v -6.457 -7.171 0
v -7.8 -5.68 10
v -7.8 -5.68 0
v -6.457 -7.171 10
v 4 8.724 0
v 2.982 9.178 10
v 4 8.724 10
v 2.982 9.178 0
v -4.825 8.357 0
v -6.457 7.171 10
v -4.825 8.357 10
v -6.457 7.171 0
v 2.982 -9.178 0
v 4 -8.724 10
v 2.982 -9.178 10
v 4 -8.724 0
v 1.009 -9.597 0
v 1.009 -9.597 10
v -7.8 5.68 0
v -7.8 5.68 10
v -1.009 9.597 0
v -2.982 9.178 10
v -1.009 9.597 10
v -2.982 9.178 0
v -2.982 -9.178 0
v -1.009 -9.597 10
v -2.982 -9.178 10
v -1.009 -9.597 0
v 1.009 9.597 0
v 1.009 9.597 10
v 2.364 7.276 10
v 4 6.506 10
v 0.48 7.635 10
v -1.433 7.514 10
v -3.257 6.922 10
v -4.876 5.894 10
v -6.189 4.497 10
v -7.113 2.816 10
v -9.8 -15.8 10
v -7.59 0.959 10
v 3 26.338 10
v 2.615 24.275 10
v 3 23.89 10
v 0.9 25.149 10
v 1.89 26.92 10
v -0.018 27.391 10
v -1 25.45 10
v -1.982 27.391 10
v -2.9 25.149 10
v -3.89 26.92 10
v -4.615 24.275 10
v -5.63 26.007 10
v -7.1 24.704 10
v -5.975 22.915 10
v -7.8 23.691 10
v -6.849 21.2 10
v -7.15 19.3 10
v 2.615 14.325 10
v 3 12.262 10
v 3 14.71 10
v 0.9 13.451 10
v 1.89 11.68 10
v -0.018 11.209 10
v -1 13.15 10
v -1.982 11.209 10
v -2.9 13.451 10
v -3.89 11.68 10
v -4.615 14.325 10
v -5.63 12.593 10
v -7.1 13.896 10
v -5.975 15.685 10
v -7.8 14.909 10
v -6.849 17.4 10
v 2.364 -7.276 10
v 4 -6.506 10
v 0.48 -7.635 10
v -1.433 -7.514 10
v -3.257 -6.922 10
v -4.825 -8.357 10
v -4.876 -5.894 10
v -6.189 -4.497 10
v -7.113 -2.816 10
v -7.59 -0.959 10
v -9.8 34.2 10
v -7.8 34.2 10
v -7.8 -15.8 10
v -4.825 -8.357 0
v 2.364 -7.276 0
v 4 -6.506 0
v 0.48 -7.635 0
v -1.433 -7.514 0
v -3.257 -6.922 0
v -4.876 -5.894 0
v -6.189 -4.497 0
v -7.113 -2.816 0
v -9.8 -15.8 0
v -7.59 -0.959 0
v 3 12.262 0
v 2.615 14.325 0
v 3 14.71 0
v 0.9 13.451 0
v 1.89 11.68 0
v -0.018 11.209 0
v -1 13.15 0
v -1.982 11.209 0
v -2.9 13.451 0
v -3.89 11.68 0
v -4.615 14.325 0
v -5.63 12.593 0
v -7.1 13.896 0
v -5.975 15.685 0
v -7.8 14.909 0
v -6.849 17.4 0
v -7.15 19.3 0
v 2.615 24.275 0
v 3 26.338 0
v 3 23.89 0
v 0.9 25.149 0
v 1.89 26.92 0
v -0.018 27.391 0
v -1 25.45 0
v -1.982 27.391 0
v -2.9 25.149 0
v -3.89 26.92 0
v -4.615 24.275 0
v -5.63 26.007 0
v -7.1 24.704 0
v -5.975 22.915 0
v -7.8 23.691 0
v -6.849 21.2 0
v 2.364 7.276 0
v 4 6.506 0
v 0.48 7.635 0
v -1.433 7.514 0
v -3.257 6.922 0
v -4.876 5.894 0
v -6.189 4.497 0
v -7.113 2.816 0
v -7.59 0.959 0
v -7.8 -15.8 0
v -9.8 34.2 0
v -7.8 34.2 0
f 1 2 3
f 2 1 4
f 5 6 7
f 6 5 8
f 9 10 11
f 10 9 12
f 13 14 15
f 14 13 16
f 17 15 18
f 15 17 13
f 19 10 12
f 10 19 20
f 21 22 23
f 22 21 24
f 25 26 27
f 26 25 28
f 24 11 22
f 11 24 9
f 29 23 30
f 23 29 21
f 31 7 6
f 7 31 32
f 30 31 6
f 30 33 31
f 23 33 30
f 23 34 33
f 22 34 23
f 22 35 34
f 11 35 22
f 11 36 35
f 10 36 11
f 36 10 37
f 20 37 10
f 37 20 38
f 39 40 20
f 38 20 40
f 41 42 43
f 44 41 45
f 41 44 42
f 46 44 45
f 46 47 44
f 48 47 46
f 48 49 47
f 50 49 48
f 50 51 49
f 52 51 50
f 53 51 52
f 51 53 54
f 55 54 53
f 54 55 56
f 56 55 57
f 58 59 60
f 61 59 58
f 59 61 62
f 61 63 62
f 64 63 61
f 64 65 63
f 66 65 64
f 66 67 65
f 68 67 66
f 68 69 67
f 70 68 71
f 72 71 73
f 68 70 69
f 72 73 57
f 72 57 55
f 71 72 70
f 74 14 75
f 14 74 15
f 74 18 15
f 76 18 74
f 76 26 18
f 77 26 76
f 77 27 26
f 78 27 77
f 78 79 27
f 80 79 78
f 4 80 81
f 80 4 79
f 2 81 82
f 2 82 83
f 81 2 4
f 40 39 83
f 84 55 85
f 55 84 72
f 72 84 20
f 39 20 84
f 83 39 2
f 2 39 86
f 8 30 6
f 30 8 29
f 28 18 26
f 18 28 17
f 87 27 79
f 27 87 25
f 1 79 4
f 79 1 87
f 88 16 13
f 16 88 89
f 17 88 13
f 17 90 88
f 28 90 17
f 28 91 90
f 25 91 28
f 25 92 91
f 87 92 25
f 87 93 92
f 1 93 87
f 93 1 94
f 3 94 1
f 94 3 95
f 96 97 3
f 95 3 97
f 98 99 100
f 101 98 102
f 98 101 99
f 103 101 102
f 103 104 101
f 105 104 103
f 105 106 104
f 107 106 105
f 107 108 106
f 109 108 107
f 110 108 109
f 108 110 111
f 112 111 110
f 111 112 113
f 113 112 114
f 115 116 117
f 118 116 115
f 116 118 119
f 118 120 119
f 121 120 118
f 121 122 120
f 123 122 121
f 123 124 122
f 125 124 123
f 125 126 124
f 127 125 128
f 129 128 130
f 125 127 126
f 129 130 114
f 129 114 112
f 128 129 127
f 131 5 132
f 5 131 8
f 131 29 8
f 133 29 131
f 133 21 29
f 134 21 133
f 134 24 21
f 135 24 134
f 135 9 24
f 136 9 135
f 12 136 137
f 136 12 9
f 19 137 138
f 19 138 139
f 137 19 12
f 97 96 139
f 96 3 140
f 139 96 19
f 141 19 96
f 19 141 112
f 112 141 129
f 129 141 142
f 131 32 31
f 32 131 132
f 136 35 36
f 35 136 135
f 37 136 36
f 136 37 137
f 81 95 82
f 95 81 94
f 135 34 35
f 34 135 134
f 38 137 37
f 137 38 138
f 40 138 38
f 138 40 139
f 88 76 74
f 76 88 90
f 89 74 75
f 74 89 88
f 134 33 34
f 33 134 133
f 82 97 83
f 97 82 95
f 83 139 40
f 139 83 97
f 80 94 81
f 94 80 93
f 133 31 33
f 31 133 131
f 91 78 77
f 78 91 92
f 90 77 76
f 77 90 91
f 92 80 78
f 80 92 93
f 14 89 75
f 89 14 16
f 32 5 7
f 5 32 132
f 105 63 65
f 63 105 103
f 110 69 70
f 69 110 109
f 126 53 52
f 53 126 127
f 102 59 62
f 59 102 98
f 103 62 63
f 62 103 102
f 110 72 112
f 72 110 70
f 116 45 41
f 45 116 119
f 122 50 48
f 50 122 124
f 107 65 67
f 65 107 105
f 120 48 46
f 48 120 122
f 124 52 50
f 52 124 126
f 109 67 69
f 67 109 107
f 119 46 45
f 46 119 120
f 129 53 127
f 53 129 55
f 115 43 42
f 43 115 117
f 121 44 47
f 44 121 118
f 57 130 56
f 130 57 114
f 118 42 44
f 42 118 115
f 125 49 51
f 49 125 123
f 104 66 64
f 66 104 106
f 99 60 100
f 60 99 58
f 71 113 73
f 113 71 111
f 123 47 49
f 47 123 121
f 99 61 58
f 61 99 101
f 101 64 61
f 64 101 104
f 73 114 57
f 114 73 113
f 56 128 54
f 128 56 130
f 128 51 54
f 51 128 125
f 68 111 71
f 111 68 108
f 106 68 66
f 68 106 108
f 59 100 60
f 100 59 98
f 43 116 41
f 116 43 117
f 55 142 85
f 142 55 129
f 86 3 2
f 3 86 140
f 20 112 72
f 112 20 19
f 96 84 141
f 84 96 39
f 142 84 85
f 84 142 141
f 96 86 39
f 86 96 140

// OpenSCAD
d1=15.3;
d2=12.3;

h1=10;

t=2.0;

module clip(ds)
{
    difference()
    {
        dst=ds+t+t;
        cylinder(h=h1, d=dst);
        cylinder(h=h1, d=ds);
        translate([t*2,-dst/2,0])
        cube([dst,dst,h1]);
    }
}

translate([-9.8,-15.8,0])
cube([t, 50, h1]);
clip(d1);
translate([-1,d1+t+t,0])
clip(d2);
